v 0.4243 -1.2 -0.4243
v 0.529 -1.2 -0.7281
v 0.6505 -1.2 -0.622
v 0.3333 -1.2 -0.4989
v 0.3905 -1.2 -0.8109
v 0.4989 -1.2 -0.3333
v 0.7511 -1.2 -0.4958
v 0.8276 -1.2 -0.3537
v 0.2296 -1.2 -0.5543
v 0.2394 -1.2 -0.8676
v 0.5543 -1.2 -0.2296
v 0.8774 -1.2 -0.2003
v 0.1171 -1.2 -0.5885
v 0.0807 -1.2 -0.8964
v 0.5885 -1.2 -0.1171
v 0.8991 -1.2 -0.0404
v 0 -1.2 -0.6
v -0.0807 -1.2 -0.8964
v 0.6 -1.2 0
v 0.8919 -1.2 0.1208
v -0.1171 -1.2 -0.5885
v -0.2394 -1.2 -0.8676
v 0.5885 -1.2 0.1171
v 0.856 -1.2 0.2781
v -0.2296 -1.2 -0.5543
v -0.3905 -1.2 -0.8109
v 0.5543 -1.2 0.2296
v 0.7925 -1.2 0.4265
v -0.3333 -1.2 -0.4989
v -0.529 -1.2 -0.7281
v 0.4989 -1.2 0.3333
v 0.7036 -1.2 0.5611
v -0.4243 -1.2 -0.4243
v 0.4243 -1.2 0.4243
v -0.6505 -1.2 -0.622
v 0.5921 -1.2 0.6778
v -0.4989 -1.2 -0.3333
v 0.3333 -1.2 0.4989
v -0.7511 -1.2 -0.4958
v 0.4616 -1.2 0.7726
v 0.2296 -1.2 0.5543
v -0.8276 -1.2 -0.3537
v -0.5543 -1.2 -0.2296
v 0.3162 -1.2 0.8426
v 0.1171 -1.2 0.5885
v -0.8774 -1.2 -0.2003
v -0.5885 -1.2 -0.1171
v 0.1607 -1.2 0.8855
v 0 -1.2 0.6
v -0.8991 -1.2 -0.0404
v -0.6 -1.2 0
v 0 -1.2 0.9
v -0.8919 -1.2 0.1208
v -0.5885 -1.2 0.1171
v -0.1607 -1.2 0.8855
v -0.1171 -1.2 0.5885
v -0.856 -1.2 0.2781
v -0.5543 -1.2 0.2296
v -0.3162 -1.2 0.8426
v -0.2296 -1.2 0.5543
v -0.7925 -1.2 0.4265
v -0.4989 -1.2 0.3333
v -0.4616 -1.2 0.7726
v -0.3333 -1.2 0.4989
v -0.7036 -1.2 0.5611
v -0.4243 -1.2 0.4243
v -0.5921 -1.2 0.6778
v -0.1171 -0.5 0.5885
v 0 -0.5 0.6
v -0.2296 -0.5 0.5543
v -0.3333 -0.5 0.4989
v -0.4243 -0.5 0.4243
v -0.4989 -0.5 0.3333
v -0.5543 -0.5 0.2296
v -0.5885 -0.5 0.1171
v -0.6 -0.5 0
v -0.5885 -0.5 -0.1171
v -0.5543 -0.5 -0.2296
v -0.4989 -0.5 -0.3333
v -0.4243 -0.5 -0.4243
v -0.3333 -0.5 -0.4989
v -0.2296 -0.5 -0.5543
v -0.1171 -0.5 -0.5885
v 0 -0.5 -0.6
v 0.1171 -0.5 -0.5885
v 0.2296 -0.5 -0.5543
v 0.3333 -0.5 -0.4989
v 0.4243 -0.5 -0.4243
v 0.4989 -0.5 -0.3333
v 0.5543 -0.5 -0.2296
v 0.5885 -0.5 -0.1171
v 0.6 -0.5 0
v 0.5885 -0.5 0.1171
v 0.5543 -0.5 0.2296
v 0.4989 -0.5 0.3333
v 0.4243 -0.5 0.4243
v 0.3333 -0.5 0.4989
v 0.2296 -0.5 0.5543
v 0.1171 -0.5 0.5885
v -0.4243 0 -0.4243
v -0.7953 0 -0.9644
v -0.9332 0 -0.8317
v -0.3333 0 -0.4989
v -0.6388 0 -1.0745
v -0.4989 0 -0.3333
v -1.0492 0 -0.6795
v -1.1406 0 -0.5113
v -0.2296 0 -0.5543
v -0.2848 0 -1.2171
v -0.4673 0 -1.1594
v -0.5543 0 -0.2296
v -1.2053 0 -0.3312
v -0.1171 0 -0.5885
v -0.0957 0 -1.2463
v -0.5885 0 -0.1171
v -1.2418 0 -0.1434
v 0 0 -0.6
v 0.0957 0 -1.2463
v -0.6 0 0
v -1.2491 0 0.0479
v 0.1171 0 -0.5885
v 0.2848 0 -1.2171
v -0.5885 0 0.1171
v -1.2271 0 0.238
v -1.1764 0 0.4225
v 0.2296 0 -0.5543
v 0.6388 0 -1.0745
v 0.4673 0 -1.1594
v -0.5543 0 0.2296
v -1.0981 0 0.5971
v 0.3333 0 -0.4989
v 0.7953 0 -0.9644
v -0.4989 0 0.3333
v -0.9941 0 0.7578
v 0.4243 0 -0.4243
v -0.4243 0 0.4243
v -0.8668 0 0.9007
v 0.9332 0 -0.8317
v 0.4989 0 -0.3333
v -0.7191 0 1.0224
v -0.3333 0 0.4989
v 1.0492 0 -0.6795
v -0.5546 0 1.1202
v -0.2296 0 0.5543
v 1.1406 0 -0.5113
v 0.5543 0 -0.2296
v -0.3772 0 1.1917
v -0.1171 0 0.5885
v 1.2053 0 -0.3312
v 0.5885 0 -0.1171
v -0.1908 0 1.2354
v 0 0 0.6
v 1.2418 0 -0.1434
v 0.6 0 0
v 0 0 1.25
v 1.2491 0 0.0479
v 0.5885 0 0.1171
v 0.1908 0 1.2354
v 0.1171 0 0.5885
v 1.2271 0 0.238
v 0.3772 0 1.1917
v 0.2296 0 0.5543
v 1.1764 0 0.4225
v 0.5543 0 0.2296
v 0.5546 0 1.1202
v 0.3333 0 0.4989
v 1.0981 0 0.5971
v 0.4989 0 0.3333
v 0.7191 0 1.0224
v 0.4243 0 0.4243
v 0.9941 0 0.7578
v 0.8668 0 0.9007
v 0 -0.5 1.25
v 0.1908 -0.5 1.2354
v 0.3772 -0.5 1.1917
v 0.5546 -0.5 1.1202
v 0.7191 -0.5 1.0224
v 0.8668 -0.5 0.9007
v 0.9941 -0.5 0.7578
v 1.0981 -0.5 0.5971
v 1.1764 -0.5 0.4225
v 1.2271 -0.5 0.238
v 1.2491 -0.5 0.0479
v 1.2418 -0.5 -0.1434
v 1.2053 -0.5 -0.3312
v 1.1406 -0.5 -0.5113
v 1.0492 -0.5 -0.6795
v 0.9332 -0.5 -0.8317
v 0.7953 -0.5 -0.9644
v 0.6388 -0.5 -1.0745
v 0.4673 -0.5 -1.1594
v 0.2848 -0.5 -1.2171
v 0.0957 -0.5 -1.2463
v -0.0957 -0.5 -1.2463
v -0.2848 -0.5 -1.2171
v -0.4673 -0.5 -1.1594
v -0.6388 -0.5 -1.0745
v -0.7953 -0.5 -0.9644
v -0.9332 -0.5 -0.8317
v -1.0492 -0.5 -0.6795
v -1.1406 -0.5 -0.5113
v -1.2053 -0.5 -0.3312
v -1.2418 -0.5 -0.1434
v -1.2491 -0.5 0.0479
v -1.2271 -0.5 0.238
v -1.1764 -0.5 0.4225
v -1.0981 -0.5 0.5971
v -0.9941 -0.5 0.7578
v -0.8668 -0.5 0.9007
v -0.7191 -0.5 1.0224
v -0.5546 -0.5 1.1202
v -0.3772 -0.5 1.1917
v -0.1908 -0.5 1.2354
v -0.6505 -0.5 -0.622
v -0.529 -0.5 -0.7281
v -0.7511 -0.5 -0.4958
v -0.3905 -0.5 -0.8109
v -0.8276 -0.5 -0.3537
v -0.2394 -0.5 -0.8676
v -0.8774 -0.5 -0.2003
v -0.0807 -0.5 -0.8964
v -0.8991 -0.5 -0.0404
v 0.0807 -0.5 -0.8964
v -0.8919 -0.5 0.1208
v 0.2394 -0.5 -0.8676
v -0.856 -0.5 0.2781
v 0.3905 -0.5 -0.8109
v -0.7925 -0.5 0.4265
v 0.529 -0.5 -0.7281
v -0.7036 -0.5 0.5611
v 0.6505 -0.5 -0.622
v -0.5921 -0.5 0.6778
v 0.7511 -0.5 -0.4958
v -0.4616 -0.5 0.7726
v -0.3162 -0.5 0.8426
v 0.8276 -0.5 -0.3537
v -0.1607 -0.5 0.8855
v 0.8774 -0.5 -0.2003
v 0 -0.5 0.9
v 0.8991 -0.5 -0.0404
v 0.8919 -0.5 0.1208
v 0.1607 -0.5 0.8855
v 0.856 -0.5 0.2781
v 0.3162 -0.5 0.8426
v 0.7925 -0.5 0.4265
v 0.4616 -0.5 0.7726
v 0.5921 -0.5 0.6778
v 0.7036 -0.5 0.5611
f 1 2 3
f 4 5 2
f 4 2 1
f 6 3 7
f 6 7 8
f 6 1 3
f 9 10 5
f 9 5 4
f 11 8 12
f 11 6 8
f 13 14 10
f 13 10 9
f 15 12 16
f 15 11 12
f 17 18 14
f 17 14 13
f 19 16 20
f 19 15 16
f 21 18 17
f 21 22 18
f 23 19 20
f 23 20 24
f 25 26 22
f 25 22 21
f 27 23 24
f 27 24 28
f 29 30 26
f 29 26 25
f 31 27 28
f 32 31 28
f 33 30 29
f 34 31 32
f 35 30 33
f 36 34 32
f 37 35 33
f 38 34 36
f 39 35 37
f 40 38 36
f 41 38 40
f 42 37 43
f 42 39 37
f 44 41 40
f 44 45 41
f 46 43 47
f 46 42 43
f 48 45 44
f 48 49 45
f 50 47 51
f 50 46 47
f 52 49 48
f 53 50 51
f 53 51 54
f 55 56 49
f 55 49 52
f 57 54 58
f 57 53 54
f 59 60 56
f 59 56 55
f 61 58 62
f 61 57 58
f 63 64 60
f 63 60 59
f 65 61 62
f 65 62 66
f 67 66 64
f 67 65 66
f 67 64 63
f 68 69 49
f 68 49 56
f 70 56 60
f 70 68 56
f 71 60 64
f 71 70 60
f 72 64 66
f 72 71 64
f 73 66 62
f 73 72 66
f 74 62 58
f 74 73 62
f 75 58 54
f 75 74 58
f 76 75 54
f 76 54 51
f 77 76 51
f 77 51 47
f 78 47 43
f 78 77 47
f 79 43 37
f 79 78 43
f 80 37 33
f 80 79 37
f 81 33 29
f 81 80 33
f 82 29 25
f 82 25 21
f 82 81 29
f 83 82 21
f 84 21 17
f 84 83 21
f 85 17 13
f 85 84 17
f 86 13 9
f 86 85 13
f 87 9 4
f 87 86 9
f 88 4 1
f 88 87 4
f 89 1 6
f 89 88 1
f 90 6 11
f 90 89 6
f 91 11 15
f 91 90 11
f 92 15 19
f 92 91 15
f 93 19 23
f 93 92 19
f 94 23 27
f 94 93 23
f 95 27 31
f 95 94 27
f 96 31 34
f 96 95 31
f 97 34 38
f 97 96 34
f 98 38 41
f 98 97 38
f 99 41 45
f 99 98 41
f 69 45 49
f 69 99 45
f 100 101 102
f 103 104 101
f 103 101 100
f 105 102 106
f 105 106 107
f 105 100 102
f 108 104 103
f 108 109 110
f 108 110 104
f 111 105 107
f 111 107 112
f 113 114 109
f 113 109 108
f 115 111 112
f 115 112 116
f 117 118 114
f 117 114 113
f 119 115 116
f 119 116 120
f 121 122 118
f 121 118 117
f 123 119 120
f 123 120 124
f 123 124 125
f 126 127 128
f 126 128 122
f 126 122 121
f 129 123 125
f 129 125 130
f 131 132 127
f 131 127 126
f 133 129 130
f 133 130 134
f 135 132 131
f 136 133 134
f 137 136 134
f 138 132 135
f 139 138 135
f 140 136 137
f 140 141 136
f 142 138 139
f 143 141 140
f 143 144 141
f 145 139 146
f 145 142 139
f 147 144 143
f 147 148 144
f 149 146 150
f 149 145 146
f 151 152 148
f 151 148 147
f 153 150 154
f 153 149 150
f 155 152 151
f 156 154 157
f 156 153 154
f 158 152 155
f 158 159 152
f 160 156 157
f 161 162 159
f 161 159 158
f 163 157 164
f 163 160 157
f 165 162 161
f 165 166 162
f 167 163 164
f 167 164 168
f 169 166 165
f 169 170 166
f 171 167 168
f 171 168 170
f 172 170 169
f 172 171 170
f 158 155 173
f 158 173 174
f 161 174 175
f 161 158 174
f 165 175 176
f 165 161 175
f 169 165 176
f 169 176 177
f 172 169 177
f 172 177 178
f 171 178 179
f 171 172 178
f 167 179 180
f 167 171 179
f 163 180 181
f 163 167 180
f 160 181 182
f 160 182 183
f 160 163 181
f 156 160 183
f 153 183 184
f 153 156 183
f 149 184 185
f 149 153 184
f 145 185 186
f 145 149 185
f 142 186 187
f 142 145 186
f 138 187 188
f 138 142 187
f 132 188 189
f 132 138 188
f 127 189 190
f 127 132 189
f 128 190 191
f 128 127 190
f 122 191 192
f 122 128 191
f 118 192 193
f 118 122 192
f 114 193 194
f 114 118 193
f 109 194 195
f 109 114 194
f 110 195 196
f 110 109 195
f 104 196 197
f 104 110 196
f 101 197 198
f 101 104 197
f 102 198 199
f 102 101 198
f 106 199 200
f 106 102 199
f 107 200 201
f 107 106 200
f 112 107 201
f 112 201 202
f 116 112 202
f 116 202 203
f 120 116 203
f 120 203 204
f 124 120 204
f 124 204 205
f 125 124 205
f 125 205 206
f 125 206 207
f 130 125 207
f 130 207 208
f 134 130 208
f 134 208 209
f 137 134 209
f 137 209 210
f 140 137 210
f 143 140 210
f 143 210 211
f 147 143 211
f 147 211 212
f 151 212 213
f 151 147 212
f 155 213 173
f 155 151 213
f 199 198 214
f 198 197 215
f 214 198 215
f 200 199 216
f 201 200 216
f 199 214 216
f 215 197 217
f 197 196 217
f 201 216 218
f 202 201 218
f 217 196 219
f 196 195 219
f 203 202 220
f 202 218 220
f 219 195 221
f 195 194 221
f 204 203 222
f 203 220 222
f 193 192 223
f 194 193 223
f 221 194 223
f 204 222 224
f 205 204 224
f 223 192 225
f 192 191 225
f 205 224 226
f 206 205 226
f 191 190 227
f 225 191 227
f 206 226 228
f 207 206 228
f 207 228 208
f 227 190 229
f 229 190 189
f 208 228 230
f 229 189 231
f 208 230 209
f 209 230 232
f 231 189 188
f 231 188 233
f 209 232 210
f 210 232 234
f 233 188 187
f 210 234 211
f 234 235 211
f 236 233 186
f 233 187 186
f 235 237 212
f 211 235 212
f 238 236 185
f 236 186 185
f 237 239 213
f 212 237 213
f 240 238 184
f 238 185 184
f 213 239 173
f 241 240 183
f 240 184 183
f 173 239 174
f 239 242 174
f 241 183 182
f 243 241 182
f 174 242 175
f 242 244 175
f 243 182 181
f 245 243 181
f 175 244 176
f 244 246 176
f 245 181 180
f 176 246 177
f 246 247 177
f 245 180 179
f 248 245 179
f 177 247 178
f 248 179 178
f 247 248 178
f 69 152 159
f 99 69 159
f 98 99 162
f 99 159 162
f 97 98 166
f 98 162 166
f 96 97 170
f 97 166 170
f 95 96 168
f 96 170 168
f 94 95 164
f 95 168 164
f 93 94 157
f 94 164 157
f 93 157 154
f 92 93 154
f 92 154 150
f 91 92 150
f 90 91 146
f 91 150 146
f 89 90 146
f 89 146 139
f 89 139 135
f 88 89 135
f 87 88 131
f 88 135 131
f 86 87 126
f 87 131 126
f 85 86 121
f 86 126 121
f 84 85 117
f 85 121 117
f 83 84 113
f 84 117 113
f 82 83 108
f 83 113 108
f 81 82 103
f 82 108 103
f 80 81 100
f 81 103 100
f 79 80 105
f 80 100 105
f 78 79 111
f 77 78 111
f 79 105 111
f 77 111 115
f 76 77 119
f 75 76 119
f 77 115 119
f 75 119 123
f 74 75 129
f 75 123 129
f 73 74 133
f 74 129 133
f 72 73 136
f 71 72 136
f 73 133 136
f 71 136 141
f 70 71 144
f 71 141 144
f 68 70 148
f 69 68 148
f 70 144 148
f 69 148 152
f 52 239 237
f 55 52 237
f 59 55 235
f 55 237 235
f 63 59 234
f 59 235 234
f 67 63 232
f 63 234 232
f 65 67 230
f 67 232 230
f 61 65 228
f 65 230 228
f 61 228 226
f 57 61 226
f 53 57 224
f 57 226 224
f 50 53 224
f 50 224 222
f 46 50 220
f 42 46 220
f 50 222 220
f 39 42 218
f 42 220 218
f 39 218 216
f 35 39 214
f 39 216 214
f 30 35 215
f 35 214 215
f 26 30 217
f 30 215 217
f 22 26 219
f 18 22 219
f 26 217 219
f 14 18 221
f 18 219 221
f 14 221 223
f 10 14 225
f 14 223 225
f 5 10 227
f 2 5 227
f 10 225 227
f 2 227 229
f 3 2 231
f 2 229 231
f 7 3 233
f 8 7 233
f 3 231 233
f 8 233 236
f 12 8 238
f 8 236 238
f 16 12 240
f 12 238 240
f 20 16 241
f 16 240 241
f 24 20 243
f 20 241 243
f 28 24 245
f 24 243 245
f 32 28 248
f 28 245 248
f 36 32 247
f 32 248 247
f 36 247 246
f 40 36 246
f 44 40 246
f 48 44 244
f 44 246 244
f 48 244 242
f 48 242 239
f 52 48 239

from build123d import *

# Parameters (mm, degrees)
SKETCH1_R           = 1.25
SKETCH1_R_2         = 0.6
BOSS_EXTRUDE1_DEPTH = 0.5
SKETCH2_R           = 0.9
SKETCH2_R_2         = 0.6
BOSS_EXTRUDE2_DEPTH = 0.7


with BuildPart() as part:
    # Sketch1 → Boss-Extrude1 (new body)
    with BuildSketch(Plane(origin=(0, 0, 0), x_dir=(1, 0, 0), z_dir=(0, 1, 0))):
        with Locations(Location((0, 0, 0), (0, 0, 270))):
            Circle(SKETCH1_R)
        with Locations(Location((0, 0, 0), (0, 0, 270))):
            Circle(SKETCH1_R_2, mode=Mode.SUBTRACT)
    extrude(amount=-BOSS_EXTRUDE1_DEPTH)

    # Sketch2 → Boss-Extrude2 (add)
    with BuildSketch(Plane.XZ.offset(0.5)):
        with Locations(Location((0, 0, 0), (0, 0, 90))):
            Circle(SKETCH2_R)
        with Locations(Location((0, 0, 0), (0, 0, 90))):
            Circle(SKETCH2_R_2, mode=Mode.SUBTRACT)
    extrude(amount=BOSS_EXTRUDE2_DEPTH)


solid = part.part
